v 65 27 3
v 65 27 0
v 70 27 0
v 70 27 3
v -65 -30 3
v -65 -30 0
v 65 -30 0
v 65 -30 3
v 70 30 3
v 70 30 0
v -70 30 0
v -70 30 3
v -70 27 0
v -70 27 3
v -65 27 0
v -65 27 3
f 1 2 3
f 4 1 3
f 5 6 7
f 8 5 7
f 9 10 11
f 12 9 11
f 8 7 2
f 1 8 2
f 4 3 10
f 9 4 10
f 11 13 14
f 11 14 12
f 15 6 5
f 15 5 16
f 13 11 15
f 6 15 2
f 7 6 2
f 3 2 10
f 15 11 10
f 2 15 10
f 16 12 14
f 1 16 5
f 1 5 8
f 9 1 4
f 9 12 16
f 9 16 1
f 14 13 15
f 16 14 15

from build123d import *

# Parameters (mm, degrees)
SKETCH2_W           = 130
SKETCH2_H           = 60
SKETCH2_W_2         = 5
SKETCH2_H_2         = 3
BOSS_EXTRUDE1_DEPTH = 3


with BuildPart() as part:
    # Sketch2 → Boss-Extrude1 (new body)
    with BuildSketch(Plane.XY):
        Rectangle(SKETCH2_W, SKETCH2_H)
        with Locations((67.5, 28.5)):
            Rectangle(SKETCH2_W_2, SKETCH2_H_2)
        with Locations((-67.5, 28.5)):
            Rectangle(SKETCH2_W_2, SKETCH2_H_2)
    extrude(amount=BOSS_EXTRUDE1_DEPTH)


solid = part.part
